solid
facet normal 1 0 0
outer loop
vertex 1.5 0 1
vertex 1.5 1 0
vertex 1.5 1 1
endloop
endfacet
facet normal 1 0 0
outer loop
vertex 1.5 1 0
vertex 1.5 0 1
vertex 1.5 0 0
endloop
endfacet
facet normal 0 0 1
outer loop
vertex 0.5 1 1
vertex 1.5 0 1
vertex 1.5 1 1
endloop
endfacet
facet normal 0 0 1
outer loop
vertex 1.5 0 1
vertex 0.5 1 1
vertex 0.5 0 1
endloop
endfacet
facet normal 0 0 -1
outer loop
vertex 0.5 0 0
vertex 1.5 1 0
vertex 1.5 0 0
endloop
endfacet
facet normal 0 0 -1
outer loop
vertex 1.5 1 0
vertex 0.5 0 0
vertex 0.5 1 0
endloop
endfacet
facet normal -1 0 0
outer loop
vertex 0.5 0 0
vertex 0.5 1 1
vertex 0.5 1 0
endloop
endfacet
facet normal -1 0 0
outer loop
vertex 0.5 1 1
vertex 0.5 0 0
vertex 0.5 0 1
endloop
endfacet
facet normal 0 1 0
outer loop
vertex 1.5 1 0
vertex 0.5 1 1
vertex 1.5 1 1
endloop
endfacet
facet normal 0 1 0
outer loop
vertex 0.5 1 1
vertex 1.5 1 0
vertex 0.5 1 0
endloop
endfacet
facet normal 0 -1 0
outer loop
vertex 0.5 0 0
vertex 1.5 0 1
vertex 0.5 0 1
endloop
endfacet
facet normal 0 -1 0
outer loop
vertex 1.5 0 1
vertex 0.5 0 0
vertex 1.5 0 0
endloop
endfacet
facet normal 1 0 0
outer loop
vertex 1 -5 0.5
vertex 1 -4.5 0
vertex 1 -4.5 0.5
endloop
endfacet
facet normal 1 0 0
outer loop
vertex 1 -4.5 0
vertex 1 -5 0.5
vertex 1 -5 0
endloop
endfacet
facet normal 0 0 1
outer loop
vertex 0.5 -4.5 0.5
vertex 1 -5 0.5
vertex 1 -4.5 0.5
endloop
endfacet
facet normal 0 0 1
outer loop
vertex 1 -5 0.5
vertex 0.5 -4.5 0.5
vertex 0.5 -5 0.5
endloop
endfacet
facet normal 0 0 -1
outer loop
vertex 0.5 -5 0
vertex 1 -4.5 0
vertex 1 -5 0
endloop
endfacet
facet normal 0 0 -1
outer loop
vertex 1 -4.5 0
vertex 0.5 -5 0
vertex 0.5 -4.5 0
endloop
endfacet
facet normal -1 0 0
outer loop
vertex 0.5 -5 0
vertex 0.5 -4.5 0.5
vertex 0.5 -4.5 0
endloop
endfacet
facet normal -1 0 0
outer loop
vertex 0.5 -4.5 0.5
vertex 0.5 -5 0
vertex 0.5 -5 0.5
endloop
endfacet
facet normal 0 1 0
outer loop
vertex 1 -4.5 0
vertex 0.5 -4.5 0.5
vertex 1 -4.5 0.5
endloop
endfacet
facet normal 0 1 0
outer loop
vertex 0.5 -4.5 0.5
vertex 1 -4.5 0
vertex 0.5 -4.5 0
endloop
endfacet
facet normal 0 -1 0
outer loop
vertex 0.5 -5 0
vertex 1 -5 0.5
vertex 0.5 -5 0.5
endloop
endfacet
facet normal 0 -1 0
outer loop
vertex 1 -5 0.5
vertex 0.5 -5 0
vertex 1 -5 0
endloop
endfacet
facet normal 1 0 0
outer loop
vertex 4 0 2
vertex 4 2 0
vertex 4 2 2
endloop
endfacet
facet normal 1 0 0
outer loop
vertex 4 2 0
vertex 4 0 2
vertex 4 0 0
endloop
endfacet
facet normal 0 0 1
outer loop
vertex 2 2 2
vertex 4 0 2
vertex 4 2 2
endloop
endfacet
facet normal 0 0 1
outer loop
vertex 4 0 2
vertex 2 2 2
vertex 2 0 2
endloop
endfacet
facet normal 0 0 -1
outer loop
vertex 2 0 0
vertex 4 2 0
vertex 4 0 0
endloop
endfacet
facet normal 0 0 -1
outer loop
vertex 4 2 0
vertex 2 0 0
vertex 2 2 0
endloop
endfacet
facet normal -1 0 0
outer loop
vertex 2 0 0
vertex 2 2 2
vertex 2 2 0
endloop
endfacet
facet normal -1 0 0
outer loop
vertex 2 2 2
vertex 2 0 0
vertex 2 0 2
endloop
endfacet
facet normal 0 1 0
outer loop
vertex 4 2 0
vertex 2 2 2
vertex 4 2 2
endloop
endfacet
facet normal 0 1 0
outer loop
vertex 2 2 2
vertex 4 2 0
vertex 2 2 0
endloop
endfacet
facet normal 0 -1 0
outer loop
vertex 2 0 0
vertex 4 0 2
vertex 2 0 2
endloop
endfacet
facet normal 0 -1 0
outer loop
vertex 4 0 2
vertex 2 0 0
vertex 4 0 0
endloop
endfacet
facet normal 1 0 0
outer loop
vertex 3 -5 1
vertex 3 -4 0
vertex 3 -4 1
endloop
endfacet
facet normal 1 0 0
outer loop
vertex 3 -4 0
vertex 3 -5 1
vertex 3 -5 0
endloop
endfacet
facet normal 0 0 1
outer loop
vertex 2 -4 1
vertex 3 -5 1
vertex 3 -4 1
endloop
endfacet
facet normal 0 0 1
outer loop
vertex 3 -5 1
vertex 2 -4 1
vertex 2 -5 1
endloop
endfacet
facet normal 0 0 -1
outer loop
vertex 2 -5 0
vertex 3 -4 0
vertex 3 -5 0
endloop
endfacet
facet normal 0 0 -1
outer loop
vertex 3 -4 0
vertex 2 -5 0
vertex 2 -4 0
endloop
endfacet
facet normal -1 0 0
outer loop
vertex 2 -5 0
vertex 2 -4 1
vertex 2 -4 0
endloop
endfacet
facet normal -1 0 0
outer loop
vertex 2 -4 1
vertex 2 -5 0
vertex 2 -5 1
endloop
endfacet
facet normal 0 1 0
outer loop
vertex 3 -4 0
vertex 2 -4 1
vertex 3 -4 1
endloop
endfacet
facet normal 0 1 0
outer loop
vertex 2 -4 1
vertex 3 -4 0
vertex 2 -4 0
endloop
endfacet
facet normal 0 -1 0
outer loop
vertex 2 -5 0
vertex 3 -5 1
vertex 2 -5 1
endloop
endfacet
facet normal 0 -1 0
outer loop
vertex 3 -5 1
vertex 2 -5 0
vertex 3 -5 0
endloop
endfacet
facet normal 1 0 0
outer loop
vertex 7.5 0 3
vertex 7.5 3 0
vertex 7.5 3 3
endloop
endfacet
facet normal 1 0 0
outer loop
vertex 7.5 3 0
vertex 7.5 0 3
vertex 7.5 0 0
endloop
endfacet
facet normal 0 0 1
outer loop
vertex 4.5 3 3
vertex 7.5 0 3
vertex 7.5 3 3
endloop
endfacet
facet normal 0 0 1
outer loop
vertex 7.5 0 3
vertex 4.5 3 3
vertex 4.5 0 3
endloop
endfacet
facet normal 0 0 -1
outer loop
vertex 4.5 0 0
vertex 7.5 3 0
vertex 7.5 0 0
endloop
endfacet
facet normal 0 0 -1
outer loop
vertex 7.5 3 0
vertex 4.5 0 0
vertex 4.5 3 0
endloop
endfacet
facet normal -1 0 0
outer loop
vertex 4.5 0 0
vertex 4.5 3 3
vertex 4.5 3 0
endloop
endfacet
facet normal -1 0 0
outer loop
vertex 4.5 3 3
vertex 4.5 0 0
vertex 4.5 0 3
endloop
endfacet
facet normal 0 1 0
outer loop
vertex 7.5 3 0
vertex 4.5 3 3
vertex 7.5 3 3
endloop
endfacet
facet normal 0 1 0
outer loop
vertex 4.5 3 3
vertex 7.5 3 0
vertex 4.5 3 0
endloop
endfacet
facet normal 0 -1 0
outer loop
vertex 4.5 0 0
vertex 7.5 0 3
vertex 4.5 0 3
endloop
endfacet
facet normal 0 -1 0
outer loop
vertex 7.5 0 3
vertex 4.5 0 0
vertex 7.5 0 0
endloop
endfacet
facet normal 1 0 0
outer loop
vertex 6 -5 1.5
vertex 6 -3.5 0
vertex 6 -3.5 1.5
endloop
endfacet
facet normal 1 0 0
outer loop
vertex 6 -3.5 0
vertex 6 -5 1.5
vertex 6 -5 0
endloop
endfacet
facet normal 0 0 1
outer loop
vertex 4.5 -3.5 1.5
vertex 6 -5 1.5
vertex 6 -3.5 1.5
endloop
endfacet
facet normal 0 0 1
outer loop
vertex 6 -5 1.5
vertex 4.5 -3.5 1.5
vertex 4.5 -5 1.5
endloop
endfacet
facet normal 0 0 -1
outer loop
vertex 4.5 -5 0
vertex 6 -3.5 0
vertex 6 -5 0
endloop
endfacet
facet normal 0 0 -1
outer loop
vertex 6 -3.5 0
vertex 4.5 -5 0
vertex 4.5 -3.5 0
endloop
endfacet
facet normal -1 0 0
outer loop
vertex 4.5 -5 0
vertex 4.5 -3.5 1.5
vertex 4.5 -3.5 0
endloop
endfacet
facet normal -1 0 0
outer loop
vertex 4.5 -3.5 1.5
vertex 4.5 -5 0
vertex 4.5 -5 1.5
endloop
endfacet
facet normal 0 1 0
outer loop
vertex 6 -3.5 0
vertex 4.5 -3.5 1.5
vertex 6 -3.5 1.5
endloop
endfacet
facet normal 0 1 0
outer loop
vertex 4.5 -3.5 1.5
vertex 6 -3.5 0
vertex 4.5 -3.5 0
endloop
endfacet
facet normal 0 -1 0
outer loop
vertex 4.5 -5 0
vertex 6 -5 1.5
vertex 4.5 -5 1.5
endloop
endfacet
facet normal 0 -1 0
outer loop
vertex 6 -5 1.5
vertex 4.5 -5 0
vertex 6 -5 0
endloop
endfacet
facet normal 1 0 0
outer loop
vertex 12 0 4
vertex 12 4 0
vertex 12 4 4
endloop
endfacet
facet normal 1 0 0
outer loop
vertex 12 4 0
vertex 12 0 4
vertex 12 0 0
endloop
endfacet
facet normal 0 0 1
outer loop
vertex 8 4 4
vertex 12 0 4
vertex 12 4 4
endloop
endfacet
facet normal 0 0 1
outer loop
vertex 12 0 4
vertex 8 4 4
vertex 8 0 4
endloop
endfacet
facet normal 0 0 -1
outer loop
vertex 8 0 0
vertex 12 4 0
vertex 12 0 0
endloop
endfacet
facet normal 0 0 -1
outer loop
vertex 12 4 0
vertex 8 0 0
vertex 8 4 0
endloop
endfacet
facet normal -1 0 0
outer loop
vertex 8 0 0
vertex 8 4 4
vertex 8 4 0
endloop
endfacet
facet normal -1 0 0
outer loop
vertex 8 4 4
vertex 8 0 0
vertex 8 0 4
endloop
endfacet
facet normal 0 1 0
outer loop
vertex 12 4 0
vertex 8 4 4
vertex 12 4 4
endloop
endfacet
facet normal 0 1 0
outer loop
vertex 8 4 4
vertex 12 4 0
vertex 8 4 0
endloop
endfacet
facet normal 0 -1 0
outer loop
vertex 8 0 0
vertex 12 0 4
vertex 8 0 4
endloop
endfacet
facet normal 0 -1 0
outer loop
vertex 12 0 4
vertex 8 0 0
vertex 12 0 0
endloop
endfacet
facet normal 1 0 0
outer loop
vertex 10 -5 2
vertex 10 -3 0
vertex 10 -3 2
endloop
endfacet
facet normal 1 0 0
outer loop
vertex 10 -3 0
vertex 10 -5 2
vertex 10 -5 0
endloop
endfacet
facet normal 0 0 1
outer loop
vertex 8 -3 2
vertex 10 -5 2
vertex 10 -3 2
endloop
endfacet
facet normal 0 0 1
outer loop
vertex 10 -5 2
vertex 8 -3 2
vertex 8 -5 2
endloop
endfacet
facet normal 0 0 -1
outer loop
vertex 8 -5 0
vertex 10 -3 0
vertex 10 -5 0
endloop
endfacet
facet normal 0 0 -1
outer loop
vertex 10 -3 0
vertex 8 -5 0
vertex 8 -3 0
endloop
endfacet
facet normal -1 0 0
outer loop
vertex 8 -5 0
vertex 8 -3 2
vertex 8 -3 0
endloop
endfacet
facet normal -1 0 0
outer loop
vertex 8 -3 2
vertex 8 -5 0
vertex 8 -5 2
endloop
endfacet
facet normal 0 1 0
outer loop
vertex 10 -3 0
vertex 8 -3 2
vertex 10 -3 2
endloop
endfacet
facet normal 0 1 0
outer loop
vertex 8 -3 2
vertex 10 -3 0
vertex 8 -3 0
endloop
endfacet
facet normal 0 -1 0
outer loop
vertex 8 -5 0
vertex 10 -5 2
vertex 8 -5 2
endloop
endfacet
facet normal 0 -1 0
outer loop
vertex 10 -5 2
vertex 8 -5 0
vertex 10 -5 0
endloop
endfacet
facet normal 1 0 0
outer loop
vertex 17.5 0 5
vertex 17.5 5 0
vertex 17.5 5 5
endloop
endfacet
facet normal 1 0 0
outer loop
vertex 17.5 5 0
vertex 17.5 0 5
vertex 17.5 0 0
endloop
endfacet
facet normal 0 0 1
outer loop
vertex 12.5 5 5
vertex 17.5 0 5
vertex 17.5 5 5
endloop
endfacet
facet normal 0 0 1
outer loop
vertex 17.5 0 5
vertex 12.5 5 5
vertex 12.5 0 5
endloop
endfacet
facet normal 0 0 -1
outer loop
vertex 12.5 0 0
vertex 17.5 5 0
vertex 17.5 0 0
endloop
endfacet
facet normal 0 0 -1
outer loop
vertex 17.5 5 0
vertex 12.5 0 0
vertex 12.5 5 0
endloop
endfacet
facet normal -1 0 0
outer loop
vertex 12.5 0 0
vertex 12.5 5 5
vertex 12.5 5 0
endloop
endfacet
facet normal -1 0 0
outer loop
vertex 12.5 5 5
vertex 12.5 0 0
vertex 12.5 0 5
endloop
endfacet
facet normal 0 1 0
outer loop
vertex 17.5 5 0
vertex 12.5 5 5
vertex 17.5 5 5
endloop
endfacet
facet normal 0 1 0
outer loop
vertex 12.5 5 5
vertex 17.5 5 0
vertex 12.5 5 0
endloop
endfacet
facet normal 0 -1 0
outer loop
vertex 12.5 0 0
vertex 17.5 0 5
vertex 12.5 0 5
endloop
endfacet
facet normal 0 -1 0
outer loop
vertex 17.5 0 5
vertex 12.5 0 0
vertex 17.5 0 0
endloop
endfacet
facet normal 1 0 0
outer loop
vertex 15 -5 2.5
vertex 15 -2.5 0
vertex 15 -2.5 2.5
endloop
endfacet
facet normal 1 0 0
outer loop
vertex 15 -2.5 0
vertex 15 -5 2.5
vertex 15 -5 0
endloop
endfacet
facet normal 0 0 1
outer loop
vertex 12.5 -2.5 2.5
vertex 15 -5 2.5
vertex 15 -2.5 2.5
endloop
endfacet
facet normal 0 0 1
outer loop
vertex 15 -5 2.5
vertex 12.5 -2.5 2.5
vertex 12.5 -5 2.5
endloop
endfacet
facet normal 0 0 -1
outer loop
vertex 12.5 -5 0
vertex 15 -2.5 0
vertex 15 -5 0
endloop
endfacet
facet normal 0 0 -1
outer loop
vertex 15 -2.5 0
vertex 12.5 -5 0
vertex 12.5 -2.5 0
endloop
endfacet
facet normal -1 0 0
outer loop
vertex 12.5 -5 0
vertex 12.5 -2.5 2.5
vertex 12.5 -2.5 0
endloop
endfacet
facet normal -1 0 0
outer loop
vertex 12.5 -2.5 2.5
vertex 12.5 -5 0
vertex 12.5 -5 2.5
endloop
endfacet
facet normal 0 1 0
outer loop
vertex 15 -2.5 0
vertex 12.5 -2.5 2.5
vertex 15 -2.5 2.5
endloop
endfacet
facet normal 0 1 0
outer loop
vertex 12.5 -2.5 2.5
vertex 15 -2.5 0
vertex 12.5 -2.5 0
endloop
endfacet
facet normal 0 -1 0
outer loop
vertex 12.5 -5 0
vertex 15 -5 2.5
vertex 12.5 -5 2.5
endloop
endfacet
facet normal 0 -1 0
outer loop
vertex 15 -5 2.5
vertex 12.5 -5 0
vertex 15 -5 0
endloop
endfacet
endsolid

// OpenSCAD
for(i=[0:5]) {
  translate([i*i/2,0,0]) {
    cube(i);
    translate([0,-5,0]) {
      f=1.0*i/2;
      cube(f);
    }
  }
}
